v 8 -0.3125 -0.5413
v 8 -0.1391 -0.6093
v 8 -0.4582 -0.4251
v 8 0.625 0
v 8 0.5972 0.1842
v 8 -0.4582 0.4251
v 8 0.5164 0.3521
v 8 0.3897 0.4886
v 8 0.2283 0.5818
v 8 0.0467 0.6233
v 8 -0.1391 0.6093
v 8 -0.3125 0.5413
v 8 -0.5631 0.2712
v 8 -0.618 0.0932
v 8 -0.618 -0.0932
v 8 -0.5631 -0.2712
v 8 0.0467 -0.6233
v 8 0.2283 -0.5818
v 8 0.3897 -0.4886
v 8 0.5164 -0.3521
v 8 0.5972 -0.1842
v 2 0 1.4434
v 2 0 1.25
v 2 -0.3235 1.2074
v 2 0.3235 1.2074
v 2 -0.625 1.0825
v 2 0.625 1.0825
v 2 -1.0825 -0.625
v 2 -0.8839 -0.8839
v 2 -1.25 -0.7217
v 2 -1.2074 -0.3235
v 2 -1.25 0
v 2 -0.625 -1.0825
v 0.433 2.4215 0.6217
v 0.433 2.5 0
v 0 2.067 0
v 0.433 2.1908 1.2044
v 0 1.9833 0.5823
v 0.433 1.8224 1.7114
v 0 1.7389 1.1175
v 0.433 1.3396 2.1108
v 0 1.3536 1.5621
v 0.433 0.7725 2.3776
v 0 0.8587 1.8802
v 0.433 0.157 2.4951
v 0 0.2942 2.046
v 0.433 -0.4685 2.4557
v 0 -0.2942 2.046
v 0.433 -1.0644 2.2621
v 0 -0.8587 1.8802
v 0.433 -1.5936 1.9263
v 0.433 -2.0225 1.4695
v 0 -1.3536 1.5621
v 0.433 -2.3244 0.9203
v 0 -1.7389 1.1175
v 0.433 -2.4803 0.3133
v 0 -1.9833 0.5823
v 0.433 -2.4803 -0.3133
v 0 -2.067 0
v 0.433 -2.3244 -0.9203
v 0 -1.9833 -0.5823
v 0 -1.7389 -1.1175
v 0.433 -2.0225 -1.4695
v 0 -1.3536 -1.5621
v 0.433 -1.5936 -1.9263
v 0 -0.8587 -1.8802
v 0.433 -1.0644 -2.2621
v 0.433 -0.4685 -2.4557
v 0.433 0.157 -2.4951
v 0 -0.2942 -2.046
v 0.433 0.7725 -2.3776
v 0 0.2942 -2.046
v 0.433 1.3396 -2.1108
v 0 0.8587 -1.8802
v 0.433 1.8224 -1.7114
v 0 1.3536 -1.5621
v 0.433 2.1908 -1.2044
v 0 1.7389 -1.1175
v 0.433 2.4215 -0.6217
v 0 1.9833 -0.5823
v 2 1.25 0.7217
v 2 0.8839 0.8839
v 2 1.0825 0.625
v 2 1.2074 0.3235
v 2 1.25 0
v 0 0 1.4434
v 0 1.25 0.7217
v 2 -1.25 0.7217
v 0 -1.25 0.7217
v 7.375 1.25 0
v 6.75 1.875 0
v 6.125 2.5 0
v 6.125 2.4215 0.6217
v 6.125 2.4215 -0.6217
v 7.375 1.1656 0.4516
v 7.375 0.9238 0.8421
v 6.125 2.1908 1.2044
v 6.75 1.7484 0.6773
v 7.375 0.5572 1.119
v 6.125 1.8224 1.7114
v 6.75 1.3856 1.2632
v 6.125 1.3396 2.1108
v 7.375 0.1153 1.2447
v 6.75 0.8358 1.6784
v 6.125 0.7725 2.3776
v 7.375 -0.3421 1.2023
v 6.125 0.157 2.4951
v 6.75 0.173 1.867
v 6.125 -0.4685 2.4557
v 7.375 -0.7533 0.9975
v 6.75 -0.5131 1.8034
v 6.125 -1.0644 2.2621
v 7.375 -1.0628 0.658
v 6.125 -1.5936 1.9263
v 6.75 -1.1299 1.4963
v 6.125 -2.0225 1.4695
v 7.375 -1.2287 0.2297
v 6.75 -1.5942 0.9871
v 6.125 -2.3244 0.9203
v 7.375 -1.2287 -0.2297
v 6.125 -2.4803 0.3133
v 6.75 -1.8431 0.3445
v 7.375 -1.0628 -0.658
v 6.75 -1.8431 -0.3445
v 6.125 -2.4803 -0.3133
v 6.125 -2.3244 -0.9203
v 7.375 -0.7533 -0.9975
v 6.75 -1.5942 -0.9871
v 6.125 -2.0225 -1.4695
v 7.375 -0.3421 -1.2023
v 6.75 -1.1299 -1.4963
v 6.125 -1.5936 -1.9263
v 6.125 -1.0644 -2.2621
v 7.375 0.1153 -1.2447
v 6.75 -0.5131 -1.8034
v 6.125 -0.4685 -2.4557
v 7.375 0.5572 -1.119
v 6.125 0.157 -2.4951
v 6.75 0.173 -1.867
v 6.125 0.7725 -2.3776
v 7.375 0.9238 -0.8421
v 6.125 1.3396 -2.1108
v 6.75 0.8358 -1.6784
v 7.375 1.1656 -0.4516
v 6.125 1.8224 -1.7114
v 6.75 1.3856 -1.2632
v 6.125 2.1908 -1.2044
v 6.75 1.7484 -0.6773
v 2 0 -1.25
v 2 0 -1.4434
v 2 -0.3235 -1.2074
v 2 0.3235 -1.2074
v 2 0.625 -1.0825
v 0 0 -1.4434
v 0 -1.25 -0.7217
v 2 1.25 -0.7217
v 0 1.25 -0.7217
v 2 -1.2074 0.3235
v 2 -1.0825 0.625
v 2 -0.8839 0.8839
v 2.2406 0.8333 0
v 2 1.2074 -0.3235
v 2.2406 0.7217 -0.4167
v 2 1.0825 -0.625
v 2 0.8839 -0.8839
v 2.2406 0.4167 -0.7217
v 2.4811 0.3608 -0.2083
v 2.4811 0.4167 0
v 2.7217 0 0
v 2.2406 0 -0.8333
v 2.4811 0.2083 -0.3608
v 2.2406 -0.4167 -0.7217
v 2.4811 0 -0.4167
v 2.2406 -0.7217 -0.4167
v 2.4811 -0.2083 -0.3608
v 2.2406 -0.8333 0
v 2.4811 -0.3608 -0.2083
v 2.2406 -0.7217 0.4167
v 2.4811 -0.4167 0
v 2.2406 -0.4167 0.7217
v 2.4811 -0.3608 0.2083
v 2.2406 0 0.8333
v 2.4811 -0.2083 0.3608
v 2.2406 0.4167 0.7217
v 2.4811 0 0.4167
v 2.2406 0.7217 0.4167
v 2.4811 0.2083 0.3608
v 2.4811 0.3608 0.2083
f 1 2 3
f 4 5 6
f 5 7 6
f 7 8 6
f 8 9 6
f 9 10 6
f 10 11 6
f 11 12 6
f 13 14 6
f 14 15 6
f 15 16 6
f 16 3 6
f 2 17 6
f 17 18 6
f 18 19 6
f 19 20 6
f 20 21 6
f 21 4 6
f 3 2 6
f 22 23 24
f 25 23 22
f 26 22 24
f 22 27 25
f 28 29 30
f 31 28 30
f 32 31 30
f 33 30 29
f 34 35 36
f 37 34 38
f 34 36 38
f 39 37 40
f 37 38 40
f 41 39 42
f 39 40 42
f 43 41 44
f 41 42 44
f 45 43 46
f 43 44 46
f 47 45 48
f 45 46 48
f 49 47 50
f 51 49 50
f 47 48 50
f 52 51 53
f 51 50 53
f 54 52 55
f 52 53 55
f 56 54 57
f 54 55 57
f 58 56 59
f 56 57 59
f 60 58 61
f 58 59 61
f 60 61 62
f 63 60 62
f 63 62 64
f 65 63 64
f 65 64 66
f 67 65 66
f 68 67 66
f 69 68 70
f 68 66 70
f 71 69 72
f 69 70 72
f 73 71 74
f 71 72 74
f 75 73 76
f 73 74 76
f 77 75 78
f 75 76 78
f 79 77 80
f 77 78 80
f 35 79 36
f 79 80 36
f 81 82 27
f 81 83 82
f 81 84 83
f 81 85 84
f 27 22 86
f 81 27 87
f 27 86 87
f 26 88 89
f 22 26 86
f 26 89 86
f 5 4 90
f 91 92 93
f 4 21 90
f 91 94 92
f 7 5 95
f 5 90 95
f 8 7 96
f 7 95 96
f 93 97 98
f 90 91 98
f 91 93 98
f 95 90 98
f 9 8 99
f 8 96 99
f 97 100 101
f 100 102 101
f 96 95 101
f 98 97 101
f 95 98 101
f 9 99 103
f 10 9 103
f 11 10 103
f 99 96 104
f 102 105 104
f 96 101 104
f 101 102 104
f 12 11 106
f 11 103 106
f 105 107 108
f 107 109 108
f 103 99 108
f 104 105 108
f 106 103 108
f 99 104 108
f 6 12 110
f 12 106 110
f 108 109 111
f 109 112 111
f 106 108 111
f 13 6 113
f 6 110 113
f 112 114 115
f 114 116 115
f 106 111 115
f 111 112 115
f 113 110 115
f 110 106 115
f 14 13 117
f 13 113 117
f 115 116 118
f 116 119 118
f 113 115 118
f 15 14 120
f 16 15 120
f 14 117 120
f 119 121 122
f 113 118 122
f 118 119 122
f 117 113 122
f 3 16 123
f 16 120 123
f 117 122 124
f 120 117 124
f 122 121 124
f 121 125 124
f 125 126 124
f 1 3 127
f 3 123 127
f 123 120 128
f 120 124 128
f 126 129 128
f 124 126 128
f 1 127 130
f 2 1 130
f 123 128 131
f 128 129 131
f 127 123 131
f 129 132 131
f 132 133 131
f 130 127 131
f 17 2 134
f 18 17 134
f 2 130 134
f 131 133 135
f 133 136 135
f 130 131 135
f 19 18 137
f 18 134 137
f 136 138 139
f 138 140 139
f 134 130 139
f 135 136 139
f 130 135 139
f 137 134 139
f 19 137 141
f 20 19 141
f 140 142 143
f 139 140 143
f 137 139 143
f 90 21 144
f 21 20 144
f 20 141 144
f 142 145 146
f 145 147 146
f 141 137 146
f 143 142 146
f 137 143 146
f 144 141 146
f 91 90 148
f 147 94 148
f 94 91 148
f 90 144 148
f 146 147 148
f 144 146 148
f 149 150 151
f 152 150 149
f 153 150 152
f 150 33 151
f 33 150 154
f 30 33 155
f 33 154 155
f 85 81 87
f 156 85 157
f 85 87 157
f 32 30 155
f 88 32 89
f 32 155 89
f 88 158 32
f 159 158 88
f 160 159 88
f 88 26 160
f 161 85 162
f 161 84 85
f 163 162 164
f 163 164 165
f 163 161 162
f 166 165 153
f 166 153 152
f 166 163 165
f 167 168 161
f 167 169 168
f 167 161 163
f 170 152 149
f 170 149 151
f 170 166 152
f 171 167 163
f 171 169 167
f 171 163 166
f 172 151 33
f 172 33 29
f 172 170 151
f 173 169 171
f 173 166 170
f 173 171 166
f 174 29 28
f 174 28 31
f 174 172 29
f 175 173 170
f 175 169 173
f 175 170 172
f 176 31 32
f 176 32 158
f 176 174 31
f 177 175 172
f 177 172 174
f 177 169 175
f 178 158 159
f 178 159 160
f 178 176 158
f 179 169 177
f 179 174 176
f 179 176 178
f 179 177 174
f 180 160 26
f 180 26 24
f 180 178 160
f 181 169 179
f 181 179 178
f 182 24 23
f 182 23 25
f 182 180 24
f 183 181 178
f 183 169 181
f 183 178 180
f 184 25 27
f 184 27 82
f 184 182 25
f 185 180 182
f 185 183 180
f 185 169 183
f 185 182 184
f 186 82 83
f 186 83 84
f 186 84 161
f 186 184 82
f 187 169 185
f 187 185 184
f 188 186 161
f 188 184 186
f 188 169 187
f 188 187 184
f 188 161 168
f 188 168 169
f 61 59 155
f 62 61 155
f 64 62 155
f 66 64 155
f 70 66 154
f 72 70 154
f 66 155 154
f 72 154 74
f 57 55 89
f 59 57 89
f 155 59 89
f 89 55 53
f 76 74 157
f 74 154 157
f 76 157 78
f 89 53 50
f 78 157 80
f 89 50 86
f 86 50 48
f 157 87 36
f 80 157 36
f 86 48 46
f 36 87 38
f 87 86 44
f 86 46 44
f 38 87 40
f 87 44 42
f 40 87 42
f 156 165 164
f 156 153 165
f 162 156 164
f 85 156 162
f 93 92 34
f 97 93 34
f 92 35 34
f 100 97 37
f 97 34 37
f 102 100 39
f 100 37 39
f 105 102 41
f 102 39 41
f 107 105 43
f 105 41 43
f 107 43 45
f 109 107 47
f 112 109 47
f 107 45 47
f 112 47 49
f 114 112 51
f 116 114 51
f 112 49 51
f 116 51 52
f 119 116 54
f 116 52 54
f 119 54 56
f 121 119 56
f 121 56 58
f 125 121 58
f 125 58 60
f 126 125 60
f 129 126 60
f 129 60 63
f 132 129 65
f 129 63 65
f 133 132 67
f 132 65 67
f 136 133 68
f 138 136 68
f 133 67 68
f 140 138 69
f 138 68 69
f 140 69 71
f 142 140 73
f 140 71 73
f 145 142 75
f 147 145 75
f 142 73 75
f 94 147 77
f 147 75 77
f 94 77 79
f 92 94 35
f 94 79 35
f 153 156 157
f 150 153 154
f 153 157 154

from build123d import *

# Parameters (mm, degrees)
HEXAGONSOCKET_DEPTH = 2


with BuildPart() as part:
    # Sketch1 → Base (revolve)
    with BuildSketch(Plane.XY):
        Polygon((0, 0), (8, 0), (8, 0.625), (6.125, 2.5), (0.433, 2.5), (0, 2.067), align=None)
    revolve(axis=Axis((-14.774129749, 0, 0), (1, 0, 0)))

    # Sketch2 → HexagonSocket (cut)
    with BuildSketch(Plane(origin=(0, 0.220293087, -0.139195271), x_dir=(0, 0, 1), z_dir=(-1, 0, 0))):
        Polygon((1.582570944, -0.220293087), (0.860883108, 1.029706913), (-0.582492565, 1.029706913), (-1.304180402, -0.220293087), (-0.582492565, -1.470293087), (0.860883108, -1.470293087), align=None)
    extrude(amount=-HEXAGONSOCKET_DEPTH, mode=Mode.SUBTRACT)

    # Sketch3 → Cut-Revolve (revolve, cut)
    with BuildSketch(Plane.XY):
        Polygon((2, 1.25), (2.721687836, 0), (2, 0), align=None)
    revolve(axis=Axis((2, 0, 0), (-1, 0, 0)), mode=Mode.SUBTRACT)


solid = part.part
